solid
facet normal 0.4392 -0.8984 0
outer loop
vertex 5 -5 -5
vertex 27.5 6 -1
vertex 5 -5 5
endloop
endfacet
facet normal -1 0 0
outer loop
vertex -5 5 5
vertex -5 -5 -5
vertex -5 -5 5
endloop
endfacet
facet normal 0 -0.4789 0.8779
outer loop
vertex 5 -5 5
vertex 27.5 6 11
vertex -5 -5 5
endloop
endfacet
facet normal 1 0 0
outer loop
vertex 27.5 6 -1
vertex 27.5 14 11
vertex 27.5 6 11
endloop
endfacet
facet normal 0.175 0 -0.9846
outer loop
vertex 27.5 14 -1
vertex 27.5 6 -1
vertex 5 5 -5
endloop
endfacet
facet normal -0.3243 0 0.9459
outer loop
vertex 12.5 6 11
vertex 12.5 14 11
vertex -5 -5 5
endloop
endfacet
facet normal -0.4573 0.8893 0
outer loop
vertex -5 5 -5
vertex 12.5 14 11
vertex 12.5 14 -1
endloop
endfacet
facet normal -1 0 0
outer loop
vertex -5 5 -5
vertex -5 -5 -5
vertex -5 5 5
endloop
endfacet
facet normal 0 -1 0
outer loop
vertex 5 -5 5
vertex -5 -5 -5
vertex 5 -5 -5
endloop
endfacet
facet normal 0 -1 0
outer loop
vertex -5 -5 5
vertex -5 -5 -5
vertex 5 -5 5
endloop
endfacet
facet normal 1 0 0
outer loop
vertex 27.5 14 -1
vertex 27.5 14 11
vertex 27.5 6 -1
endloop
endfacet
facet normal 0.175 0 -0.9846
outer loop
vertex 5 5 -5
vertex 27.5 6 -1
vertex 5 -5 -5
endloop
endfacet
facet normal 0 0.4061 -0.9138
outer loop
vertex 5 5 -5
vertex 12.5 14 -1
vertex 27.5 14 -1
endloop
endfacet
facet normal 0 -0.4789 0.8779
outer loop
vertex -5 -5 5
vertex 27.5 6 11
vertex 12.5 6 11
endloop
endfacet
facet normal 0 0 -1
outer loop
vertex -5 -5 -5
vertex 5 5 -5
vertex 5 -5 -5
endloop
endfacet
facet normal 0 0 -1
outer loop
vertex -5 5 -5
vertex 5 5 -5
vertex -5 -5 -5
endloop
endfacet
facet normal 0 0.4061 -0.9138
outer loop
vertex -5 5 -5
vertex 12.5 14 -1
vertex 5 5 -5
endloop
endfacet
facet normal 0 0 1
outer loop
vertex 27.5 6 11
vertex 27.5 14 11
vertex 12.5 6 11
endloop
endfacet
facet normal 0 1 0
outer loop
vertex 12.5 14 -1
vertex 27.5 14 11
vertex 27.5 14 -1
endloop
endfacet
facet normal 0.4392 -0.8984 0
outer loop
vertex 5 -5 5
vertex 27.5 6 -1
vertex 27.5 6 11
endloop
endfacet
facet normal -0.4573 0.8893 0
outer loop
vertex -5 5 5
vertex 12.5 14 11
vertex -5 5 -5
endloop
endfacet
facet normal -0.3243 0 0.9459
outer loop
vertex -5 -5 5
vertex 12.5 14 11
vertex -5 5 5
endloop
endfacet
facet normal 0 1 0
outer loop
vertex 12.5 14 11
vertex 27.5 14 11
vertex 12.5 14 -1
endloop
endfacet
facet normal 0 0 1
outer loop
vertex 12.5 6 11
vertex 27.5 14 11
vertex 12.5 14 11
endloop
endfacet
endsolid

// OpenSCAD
// =============================================================================
// test_hull_two_cubes.scad
//
// Simplest possible hull: two cubes separated in space.
// Expected: a rectangular prism bridging both cubes.
// =============================================================================

$fn = 24;

hull() {
    cube([10, 10, 10], center = true);
    translate([20, 10, 5]) {
        cube([15, 8, 12], center = true);
    }
}
